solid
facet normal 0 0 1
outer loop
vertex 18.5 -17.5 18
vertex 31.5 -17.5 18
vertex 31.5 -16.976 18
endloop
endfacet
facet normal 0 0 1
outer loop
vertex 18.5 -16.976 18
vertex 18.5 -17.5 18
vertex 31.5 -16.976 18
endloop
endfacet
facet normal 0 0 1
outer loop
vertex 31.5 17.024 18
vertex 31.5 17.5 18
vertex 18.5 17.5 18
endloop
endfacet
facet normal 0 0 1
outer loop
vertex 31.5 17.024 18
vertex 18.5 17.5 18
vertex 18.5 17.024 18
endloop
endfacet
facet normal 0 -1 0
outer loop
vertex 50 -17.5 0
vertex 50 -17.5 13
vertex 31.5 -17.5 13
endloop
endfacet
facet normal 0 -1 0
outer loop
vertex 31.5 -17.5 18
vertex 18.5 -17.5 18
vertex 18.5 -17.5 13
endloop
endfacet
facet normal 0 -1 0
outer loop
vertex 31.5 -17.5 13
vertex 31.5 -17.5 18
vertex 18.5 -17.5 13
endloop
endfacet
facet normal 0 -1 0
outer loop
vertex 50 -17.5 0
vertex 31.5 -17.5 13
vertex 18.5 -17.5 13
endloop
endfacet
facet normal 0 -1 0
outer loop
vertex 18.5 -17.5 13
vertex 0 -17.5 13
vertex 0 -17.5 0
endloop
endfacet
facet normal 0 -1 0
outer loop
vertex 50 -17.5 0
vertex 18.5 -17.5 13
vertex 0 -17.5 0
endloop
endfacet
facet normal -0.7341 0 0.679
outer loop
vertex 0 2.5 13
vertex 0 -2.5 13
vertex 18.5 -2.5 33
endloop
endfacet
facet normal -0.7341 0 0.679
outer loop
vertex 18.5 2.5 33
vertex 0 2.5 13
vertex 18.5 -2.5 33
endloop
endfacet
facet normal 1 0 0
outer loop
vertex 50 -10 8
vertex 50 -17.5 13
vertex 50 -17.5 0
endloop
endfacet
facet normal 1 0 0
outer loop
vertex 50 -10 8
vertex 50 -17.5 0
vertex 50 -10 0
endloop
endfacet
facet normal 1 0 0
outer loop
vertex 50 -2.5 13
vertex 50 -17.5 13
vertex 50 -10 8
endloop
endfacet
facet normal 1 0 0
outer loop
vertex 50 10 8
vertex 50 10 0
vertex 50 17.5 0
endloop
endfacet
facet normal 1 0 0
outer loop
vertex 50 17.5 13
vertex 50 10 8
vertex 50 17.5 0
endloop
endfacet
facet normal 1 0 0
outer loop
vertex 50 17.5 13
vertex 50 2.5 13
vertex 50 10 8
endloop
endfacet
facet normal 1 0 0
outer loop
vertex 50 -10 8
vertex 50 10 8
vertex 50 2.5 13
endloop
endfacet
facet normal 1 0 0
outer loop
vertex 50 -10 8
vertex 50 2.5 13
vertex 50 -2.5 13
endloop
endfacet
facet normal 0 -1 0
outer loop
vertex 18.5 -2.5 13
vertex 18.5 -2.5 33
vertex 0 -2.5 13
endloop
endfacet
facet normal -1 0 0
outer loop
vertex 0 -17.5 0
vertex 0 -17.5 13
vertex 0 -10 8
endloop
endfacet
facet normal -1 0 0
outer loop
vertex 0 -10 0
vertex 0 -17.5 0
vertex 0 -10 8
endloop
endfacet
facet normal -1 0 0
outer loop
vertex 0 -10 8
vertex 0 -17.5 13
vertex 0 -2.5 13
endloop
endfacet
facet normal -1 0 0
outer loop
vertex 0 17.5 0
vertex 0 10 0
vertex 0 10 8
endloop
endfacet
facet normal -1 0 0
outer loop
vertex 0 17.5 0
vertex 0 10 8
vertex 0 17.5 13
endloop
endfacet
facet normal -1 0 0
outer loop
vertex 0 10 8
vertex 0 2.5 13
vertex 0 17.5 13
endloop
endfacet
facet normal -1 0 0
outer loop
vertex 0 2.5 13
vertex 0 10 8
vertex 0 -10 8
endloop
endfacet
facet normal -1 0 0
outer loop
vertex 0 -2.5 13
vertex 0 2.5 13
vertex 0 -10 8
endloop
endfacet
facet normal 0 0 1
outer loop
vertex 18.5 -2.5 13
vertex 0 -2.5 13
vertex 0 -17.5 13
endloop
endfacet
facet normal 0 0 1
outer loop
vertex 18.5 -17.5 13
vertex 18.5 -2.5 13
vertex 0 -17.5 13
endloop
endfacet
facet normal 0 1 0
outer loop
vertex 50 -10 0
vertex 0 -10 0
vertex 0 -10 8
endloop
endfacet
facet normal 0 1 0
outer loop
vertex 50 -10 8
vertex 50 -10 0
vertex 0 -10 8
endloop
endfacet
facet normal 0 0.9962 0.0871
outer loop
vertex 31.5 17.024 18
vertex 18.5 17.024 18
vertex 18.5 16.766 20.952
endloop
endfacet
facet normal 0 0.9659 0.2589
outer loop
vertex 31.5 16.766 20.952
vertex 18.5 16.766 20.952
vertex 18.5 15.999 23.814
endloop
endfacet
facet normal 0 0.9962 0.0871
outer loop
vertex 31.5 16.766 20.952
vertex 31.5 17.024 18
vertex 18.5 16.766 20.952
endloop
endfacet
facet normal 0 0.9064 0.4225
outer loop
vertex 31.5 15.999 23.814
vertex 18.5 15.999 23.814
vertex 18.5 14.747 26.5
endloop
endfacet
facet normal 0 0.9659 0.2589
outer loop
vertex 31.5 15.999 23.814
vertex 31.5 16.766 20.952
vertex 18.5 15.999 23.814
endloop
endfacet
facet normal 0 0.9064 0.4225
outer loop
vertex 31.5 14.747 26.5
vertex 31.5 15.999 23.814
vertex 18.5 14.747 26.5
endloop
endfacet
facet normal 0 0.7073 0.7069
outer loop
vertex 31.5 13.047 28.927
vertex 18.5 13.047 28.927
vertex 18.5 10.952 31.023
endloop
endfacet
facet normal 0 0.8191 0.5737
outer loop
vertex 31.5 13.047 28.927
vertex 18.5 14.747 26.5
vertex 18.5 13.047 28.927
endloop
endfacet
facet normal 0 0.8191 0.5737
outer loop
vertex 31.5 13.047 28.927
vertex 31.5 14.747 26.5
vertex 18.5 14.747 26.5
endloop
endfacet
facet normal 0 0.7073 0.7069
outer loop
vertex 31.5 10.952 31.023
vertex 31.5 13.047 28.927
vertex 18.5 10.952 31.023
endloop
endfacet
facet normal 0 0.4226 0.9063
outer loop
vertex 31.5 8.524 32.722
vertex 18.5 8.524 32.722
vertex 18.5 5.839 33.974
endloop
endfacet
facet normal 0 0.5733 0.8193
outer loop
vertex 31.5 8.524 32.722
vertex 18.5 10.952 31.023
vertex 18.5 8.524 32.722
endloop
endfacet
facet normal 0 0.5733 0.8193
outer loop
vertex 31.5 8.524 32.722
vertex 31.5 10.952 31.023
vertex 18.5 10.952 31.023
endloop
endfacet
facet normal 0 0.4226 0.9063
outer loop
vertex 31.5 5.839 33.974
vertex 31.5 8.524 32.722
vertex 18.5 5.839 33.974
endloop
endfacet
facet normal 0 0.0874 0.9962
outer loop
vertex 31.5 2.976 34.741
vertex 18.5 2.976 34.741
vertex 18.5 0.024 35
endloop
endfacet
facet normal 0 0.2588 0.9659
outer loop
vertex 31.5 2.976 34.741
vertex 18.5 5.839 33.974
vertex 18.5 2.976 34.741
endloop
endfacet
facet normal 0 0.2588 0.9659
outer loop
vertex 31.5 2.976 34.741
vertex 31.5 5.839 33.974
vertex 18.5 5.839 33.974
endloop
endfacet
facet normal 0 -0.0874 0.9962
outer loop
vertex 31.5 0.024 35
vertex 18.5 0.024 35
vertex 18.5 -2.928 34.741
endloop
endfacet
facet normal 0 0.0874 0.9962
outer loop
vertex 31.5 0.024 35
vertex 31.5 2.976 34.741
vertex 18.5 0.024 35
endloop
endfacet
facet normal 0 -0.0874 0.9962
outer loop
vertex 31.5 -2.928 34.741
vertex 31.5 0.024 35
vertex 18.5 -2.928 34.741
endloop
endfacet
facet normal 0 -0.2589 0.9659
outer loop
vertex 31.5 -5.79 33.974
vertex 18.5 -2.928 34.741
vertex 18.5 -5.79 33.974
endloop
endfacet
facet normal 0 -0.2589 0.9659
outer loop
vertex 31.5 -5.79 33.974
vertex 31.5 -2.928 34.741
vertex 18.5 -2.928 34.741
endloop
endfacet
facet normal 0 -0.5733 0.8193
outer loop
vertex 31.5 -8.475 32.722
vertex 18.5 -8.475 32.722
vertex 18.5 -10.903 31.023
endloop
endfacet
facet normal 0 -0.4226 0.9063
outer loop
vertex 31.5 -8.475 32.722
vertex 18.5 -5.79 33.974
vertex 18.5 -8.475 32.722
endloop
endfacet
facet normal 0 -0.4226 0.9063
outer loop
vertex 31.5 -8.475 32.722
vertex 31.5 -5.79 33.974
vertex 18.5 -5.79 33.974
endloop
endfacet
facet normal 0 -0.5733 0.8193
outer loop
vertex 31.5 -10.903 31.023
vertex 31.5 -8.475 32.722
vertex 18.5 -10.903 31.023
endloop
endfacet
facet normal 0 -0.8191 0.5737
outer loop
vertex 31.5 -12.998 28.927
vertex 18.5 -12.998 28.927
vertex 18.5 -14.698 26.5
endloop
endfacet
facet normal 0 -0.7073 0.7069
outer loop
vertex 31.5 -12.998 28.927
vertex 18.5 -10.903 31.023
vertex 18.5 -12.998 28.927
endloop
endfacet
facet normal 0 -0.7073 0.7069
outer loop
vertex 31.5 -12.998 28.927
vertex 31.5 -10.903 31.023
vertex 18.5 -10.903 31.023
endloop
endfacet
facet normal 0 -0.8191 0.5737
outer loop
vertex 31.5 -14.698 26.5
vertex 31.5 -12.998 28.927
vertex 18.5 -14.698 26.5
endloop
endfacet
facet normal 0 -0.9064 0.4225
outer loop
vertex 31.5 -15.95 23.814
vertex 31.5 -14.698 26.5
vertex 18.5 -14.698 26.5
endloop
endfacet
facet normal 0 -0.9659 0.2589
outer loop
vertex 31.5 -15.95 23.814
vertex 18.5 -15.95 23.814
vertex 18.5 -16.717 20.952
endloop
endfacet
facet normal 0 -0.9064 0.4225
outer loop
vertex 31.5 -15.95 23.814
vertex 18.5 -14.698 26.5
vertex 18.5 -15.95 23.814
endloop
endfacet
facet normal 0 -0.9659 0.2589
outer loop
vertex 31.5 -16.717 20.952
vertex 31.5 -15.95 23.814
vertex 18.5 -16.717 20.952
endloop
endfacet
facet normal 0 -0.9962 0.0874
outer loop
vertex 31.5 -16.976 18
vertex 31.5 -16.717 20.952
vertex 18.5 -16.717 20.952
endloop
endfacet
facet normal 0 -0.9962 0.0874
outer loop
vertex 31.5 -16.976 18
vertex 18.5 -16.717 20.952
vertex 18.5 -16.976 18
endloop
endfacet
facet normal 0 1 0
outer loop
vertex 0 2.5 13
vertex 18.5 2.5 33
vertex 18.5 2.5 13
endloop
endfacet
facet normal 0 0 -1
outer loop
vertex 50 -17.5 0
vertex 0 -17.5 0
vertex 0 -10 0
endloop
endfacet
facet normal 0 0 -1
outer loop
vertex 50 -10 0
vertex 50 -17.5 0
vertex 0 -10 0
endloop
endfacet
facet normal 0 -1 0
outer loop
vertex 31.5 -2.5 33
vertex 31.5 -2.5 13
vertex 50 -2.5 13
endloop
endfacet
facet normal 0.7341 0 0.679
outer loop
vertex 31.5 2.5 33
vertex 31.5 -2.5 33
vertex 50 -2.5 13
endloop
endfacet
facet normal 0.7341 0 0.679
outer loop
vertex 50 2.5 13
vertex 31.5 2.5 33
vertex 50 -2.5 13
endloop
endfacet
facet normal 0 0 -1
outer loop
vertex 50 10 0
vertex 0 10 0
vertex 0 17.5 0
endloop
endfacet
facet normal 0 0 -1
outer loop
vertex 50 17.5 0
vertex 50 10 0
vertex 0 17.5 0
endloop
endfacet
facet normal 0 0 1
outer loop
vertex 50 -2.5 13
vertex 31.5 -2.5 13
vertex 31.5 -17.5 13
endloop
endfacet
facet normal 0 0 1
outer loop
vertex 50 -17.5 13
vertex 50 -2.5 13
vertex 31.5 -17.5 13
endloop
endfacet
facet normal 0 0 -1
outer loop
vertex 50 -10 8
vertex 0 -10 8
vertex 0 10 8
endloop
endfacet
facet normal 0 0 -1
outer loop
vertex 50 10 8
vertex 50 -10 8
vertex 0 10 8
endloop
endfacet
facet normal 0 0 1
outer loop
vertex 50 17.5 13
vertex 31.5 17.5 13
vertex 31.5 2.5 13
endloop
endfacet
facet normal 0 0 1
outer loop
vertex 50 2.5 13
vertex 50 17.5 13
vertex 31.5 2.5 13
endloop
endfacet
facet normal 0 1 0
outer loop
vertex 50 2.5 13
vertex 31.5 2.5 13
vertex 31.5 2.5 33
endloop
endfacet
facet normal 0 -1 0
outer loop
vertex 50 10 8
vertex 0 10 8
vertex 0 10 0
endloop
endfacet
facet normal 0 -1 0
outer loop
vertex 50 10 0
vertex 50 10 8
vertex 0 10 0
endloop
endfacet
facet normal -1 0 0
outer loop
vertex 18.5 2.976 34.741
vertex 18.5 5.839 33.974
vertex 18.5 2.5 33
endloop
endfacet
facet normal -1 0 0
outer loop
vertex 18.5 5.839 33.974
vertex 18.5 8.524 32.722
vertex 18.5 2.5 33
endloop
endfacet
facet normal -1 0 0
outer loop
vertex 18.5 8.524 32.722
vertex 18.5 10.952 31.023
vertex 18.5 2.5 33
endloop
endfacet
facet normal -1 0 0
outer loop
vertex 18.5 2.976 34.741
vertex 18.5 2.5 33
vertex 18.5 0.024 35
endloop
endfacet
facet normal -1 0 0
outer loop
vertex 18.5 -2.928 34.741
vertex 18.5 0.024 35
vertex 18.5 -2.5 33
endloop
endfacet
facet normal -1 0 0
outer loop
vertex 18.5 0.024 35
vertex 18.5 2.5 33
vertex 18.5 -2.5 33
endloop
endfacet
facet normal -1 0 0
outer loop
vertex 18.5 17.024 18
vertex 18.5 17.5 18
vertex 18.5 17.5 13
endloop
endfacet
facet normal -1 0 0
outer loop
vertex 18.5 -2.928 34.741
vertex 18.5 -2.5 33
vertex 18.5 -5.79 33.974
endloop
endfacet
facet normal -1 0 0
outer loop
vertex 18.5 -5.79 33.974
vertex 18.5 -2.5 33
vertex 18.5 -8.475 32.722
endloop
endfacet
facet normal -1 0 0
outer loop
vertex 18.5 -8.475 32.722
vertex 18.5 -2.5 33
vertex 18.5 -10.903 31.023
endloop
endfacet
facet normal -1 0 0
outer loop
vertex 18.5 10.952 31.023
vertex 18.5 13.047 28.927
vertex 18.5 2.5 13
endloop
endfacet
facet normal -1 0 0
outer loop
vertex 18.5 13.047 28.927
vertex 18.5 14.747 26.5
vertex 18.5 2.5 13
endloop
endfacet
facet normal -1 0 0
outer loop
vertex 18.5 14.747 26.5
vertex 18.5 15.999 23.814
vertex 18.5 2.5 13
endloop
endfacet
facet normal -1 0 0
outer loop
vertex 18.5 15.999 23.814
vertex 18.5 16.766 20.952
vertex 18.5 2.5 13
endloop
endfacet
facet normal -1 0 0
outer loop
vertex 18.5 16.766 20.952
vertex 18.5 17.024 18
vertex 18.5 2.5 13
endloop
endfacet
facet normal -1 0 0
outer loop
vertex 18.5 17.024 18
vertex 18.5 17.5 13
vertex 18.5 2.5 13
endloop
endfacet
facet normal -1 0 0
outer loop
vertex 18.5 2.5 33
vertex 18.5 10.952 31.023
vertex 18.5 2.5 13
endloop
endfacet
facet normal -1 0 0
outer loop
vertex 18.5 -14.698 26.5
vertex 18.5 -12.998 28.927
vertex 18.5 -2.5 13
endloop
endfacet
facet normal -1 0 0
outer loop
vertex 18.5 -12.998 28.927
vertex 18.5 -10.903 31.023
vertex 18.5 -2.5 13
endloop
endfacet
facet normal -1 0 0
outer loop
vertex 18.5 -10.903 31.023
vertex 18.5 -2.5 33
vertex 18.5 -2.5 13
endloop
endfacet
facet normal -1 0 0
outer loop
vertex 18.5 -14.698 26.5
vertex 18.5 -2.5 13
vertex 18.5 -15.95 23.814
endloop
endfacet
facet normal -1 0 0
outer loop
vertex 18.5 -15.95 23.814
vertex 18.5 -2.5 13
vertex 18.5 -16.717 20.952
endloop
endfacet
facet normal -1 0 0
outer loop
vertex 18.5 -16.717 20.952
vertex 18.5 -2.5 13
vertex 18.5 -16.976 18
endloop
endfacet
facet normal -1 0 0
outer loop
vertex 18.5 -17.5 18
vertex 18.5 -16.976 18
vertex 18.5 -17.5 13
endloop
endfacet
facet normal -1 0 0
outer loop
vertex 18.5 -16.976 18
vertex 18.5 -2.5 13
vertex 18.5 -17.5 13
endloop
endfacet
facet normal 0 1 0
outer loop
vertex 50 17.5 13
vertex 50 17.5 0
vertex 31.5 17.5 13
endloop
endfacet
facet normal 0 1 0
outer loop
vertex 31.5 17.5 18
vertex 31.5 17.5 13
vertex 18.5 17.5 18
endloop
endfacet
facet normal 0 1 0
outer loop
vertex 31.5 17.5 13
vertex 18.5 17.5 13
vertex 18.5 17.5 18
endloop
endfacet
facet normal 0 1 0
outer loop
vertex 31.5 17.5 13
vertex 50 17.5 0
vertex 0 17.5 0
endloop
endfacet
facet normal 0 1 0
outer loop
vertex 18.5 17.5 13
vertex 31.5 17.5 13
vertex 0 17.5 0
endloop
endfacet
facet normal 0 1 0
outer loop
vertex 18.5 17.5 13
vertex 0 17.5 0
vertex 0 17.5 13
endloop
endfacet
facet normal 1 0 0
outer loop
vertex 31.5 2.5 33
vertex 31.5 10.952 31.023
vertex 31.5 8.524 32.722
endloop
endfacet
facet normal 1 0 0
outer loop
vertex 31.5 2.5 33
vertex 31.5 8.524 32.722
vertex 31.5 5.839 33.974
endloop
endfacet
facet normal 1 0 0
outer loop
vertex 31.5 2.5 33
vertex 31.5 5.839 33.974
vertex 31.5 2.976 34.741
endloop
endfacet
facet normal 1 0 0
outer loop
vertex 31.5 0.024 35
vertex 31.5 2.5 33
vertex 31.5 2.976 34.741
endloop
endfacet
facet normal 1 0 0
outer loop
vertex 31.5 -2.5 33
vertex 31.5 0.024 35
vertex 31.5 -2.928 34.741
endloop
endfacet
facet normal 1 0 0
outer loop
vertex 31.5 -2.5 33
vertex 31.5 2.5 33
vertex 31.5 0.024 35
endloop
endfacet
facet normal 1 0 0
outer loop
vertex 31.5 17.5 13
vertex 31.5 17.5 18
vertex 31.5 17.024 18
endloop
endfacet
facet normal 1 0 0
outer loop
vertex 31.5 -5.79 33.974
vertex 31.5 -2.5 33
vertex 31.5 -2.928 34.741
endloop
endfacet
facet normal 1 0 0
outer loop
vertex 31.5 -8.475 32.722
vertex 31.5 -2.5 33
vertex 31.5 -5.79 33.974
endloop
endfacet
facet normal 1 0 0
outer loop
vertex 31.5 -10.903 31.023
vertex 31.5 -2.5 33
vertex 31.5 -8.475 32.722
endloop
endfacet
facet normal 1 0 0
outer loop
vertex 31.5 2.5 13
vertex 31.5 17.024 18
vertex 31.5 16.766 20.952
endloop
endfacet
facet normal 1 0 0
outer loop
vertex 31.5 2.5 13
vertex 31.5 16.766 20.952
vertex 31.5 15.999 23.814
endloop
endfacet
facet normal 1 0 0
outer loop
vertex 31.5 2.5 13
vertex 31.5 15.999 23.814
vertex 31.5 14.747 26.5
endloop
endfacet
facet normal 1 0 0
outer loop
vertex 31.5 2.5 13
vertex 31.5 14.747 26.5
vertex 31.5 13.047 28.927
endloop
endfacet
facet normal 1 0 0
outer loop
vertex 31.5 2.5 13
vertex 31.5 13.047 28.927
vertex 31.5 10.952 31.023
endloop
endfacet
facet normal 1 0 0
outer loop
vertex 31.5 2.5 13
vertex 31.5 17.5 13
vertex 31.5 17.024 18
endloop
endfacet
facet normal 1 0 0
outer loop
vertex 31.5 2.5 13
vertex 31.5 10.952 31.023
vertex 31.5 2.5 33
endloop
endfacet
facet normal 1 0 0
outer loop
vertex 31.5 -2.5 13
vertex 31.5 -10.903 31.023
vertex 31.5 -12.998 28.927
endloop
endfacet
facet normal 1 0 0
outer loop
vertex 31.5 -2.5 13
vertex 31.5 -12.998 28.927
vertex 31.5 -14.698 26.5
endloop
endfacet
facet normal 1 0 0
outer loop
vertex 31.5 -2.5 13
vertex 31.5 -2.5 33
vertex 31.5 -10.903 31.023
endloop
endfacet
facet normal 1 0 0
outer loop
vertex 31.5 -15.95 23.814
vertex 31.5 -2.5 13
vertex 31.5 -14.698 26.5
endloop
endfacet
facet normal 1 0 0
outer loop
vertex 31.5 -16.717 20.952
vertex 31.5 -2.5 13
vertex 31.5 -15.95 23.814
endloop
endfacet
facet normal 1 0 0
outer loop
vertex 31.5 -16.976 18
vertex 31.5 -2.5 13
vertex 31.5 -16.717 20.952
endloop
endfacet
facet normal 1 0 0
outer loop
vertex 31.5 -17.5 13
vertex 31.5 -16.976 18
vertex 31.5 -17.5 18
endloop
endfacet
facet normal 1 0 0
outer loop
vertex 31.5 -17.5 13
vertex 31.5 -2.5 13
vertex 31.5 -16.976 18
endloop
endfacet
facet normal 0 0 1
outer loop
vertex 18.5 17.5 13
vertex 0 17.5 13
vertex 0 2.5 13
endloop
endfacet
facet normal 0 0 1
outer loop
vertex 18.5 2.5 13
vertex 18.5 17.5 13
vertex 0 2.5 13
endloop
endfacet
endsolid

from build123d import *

# Parameters (mm, degrees)
PAD_DEPTH       = 50
SKETCH001_W     = 35
SKETCH001_H     = 13
PAD001_DEPTH    = 25
POCKET_DEPTH    = 31.501
SKETCH003_W     = 5
SKETCH003_H     = 20
PAD002_DEPTH    = 18.5
POCKET001_DEPTH = 20.001
SKETCH005_W     = 5
SKETCH005_H     = 20
PAD003_DEPTH    = 18.5
POCKET002_DEPTH = 20.001


with BuildPart() as part:
    # Sketch → Pad (new body)
    with BuildSketch(Plane.YZ):
        Polygon((17.5, 0), (17.5, 13), (-17.5, 13), (-17.5, 0), (-10, 0), (-10, 8), (10, 8), (10, 0), align=None)
    extrude(amount=PAD_DEPTH)

    # Sketch001 (on Face2 of Pad) → Pad001 (join)
    with BuildSketch(Plane(origin=(0, 0, 13), x_dir=(0, -1, 0), z_dir=(0, 0, 1))):
        with Locations((0, 25)):
            Rectangle(SKETCH001_W, SKETCH001_H)
    extrude(amount=PAD001_DEPTH)

    # Sketch002 (on Face8 of Pad001) → Pocket (cut, through all)
    with BuildSketch(Plane.YZ.offset(31.5)):
        with BuildLine():
            Line((-17.5, 38), (-17.5, 18))
            Line((-17.5, 18), (-16.975592, 18))
            ThreePointArc((17.024408, 18), (0.024408, 34.999671), (-16.975592, 18))
            Line((17.5, 18), (17.024408, 18))
            Line((17.5, 18), (17.5, 38))
            Line((17.5, 38), (-17.5, 38))
        make_face()
    extrude(amount=-POCKET_DEPTH, mode=Mode.SUBTRACT)

    # Sketch003 (on Face2 of Pocket) → Pad002 (join)
    with BuildSketch(Plane.YZ.offset(31.5)):
        with Locations((0, 23)):
            Rectangle(SKETCH003_W, SKETCH003_H)
    extrude(amount=PAD002_DEPTH)

    # Sketch004 (on Face3 of Pad002) → Pocket001 (cut, through all)
    with BuildSketch(Plane(origin=(0, -2.5, 0), x_dir=(0, 0, -1), z_dir=(0, -1, 0))):
        Polygon((-33, 50), (-33, 31.5), (-13, 50), align=None)
    extrude(amount=-POCKET001_DEPTH, mode=Mode.SUBTRACT)

    # Sketch005 (on Face6 of Pocket001) → Pad003 (join)
    with BuildSketch(Plane(origin=(18.5, 0, 0), x_dir=(0, 1, 0), z_dir=(-1, 0, 0))):
        with Locations((0, -23)):
            Rectangle(SKETCH005_W, SKETCH005_H)
    extrude(amount=PAD003_DEPTH)

    # Sketch006 (on Face20 of Pad003) → Pocket002 (cut, through all)
    with BuildSketch(Plane(origin=(0, -2.5, 0), x_dir=(0, 0, -1), z_dir=(0, -1, 0))):
        Polygon((-33, 18.5), (-33, 0), (-13, 0), align=None)
    extrude(amount=-POCKET002_DEPTH, mode=Mode.SUBTRACT)


solid = part.part
